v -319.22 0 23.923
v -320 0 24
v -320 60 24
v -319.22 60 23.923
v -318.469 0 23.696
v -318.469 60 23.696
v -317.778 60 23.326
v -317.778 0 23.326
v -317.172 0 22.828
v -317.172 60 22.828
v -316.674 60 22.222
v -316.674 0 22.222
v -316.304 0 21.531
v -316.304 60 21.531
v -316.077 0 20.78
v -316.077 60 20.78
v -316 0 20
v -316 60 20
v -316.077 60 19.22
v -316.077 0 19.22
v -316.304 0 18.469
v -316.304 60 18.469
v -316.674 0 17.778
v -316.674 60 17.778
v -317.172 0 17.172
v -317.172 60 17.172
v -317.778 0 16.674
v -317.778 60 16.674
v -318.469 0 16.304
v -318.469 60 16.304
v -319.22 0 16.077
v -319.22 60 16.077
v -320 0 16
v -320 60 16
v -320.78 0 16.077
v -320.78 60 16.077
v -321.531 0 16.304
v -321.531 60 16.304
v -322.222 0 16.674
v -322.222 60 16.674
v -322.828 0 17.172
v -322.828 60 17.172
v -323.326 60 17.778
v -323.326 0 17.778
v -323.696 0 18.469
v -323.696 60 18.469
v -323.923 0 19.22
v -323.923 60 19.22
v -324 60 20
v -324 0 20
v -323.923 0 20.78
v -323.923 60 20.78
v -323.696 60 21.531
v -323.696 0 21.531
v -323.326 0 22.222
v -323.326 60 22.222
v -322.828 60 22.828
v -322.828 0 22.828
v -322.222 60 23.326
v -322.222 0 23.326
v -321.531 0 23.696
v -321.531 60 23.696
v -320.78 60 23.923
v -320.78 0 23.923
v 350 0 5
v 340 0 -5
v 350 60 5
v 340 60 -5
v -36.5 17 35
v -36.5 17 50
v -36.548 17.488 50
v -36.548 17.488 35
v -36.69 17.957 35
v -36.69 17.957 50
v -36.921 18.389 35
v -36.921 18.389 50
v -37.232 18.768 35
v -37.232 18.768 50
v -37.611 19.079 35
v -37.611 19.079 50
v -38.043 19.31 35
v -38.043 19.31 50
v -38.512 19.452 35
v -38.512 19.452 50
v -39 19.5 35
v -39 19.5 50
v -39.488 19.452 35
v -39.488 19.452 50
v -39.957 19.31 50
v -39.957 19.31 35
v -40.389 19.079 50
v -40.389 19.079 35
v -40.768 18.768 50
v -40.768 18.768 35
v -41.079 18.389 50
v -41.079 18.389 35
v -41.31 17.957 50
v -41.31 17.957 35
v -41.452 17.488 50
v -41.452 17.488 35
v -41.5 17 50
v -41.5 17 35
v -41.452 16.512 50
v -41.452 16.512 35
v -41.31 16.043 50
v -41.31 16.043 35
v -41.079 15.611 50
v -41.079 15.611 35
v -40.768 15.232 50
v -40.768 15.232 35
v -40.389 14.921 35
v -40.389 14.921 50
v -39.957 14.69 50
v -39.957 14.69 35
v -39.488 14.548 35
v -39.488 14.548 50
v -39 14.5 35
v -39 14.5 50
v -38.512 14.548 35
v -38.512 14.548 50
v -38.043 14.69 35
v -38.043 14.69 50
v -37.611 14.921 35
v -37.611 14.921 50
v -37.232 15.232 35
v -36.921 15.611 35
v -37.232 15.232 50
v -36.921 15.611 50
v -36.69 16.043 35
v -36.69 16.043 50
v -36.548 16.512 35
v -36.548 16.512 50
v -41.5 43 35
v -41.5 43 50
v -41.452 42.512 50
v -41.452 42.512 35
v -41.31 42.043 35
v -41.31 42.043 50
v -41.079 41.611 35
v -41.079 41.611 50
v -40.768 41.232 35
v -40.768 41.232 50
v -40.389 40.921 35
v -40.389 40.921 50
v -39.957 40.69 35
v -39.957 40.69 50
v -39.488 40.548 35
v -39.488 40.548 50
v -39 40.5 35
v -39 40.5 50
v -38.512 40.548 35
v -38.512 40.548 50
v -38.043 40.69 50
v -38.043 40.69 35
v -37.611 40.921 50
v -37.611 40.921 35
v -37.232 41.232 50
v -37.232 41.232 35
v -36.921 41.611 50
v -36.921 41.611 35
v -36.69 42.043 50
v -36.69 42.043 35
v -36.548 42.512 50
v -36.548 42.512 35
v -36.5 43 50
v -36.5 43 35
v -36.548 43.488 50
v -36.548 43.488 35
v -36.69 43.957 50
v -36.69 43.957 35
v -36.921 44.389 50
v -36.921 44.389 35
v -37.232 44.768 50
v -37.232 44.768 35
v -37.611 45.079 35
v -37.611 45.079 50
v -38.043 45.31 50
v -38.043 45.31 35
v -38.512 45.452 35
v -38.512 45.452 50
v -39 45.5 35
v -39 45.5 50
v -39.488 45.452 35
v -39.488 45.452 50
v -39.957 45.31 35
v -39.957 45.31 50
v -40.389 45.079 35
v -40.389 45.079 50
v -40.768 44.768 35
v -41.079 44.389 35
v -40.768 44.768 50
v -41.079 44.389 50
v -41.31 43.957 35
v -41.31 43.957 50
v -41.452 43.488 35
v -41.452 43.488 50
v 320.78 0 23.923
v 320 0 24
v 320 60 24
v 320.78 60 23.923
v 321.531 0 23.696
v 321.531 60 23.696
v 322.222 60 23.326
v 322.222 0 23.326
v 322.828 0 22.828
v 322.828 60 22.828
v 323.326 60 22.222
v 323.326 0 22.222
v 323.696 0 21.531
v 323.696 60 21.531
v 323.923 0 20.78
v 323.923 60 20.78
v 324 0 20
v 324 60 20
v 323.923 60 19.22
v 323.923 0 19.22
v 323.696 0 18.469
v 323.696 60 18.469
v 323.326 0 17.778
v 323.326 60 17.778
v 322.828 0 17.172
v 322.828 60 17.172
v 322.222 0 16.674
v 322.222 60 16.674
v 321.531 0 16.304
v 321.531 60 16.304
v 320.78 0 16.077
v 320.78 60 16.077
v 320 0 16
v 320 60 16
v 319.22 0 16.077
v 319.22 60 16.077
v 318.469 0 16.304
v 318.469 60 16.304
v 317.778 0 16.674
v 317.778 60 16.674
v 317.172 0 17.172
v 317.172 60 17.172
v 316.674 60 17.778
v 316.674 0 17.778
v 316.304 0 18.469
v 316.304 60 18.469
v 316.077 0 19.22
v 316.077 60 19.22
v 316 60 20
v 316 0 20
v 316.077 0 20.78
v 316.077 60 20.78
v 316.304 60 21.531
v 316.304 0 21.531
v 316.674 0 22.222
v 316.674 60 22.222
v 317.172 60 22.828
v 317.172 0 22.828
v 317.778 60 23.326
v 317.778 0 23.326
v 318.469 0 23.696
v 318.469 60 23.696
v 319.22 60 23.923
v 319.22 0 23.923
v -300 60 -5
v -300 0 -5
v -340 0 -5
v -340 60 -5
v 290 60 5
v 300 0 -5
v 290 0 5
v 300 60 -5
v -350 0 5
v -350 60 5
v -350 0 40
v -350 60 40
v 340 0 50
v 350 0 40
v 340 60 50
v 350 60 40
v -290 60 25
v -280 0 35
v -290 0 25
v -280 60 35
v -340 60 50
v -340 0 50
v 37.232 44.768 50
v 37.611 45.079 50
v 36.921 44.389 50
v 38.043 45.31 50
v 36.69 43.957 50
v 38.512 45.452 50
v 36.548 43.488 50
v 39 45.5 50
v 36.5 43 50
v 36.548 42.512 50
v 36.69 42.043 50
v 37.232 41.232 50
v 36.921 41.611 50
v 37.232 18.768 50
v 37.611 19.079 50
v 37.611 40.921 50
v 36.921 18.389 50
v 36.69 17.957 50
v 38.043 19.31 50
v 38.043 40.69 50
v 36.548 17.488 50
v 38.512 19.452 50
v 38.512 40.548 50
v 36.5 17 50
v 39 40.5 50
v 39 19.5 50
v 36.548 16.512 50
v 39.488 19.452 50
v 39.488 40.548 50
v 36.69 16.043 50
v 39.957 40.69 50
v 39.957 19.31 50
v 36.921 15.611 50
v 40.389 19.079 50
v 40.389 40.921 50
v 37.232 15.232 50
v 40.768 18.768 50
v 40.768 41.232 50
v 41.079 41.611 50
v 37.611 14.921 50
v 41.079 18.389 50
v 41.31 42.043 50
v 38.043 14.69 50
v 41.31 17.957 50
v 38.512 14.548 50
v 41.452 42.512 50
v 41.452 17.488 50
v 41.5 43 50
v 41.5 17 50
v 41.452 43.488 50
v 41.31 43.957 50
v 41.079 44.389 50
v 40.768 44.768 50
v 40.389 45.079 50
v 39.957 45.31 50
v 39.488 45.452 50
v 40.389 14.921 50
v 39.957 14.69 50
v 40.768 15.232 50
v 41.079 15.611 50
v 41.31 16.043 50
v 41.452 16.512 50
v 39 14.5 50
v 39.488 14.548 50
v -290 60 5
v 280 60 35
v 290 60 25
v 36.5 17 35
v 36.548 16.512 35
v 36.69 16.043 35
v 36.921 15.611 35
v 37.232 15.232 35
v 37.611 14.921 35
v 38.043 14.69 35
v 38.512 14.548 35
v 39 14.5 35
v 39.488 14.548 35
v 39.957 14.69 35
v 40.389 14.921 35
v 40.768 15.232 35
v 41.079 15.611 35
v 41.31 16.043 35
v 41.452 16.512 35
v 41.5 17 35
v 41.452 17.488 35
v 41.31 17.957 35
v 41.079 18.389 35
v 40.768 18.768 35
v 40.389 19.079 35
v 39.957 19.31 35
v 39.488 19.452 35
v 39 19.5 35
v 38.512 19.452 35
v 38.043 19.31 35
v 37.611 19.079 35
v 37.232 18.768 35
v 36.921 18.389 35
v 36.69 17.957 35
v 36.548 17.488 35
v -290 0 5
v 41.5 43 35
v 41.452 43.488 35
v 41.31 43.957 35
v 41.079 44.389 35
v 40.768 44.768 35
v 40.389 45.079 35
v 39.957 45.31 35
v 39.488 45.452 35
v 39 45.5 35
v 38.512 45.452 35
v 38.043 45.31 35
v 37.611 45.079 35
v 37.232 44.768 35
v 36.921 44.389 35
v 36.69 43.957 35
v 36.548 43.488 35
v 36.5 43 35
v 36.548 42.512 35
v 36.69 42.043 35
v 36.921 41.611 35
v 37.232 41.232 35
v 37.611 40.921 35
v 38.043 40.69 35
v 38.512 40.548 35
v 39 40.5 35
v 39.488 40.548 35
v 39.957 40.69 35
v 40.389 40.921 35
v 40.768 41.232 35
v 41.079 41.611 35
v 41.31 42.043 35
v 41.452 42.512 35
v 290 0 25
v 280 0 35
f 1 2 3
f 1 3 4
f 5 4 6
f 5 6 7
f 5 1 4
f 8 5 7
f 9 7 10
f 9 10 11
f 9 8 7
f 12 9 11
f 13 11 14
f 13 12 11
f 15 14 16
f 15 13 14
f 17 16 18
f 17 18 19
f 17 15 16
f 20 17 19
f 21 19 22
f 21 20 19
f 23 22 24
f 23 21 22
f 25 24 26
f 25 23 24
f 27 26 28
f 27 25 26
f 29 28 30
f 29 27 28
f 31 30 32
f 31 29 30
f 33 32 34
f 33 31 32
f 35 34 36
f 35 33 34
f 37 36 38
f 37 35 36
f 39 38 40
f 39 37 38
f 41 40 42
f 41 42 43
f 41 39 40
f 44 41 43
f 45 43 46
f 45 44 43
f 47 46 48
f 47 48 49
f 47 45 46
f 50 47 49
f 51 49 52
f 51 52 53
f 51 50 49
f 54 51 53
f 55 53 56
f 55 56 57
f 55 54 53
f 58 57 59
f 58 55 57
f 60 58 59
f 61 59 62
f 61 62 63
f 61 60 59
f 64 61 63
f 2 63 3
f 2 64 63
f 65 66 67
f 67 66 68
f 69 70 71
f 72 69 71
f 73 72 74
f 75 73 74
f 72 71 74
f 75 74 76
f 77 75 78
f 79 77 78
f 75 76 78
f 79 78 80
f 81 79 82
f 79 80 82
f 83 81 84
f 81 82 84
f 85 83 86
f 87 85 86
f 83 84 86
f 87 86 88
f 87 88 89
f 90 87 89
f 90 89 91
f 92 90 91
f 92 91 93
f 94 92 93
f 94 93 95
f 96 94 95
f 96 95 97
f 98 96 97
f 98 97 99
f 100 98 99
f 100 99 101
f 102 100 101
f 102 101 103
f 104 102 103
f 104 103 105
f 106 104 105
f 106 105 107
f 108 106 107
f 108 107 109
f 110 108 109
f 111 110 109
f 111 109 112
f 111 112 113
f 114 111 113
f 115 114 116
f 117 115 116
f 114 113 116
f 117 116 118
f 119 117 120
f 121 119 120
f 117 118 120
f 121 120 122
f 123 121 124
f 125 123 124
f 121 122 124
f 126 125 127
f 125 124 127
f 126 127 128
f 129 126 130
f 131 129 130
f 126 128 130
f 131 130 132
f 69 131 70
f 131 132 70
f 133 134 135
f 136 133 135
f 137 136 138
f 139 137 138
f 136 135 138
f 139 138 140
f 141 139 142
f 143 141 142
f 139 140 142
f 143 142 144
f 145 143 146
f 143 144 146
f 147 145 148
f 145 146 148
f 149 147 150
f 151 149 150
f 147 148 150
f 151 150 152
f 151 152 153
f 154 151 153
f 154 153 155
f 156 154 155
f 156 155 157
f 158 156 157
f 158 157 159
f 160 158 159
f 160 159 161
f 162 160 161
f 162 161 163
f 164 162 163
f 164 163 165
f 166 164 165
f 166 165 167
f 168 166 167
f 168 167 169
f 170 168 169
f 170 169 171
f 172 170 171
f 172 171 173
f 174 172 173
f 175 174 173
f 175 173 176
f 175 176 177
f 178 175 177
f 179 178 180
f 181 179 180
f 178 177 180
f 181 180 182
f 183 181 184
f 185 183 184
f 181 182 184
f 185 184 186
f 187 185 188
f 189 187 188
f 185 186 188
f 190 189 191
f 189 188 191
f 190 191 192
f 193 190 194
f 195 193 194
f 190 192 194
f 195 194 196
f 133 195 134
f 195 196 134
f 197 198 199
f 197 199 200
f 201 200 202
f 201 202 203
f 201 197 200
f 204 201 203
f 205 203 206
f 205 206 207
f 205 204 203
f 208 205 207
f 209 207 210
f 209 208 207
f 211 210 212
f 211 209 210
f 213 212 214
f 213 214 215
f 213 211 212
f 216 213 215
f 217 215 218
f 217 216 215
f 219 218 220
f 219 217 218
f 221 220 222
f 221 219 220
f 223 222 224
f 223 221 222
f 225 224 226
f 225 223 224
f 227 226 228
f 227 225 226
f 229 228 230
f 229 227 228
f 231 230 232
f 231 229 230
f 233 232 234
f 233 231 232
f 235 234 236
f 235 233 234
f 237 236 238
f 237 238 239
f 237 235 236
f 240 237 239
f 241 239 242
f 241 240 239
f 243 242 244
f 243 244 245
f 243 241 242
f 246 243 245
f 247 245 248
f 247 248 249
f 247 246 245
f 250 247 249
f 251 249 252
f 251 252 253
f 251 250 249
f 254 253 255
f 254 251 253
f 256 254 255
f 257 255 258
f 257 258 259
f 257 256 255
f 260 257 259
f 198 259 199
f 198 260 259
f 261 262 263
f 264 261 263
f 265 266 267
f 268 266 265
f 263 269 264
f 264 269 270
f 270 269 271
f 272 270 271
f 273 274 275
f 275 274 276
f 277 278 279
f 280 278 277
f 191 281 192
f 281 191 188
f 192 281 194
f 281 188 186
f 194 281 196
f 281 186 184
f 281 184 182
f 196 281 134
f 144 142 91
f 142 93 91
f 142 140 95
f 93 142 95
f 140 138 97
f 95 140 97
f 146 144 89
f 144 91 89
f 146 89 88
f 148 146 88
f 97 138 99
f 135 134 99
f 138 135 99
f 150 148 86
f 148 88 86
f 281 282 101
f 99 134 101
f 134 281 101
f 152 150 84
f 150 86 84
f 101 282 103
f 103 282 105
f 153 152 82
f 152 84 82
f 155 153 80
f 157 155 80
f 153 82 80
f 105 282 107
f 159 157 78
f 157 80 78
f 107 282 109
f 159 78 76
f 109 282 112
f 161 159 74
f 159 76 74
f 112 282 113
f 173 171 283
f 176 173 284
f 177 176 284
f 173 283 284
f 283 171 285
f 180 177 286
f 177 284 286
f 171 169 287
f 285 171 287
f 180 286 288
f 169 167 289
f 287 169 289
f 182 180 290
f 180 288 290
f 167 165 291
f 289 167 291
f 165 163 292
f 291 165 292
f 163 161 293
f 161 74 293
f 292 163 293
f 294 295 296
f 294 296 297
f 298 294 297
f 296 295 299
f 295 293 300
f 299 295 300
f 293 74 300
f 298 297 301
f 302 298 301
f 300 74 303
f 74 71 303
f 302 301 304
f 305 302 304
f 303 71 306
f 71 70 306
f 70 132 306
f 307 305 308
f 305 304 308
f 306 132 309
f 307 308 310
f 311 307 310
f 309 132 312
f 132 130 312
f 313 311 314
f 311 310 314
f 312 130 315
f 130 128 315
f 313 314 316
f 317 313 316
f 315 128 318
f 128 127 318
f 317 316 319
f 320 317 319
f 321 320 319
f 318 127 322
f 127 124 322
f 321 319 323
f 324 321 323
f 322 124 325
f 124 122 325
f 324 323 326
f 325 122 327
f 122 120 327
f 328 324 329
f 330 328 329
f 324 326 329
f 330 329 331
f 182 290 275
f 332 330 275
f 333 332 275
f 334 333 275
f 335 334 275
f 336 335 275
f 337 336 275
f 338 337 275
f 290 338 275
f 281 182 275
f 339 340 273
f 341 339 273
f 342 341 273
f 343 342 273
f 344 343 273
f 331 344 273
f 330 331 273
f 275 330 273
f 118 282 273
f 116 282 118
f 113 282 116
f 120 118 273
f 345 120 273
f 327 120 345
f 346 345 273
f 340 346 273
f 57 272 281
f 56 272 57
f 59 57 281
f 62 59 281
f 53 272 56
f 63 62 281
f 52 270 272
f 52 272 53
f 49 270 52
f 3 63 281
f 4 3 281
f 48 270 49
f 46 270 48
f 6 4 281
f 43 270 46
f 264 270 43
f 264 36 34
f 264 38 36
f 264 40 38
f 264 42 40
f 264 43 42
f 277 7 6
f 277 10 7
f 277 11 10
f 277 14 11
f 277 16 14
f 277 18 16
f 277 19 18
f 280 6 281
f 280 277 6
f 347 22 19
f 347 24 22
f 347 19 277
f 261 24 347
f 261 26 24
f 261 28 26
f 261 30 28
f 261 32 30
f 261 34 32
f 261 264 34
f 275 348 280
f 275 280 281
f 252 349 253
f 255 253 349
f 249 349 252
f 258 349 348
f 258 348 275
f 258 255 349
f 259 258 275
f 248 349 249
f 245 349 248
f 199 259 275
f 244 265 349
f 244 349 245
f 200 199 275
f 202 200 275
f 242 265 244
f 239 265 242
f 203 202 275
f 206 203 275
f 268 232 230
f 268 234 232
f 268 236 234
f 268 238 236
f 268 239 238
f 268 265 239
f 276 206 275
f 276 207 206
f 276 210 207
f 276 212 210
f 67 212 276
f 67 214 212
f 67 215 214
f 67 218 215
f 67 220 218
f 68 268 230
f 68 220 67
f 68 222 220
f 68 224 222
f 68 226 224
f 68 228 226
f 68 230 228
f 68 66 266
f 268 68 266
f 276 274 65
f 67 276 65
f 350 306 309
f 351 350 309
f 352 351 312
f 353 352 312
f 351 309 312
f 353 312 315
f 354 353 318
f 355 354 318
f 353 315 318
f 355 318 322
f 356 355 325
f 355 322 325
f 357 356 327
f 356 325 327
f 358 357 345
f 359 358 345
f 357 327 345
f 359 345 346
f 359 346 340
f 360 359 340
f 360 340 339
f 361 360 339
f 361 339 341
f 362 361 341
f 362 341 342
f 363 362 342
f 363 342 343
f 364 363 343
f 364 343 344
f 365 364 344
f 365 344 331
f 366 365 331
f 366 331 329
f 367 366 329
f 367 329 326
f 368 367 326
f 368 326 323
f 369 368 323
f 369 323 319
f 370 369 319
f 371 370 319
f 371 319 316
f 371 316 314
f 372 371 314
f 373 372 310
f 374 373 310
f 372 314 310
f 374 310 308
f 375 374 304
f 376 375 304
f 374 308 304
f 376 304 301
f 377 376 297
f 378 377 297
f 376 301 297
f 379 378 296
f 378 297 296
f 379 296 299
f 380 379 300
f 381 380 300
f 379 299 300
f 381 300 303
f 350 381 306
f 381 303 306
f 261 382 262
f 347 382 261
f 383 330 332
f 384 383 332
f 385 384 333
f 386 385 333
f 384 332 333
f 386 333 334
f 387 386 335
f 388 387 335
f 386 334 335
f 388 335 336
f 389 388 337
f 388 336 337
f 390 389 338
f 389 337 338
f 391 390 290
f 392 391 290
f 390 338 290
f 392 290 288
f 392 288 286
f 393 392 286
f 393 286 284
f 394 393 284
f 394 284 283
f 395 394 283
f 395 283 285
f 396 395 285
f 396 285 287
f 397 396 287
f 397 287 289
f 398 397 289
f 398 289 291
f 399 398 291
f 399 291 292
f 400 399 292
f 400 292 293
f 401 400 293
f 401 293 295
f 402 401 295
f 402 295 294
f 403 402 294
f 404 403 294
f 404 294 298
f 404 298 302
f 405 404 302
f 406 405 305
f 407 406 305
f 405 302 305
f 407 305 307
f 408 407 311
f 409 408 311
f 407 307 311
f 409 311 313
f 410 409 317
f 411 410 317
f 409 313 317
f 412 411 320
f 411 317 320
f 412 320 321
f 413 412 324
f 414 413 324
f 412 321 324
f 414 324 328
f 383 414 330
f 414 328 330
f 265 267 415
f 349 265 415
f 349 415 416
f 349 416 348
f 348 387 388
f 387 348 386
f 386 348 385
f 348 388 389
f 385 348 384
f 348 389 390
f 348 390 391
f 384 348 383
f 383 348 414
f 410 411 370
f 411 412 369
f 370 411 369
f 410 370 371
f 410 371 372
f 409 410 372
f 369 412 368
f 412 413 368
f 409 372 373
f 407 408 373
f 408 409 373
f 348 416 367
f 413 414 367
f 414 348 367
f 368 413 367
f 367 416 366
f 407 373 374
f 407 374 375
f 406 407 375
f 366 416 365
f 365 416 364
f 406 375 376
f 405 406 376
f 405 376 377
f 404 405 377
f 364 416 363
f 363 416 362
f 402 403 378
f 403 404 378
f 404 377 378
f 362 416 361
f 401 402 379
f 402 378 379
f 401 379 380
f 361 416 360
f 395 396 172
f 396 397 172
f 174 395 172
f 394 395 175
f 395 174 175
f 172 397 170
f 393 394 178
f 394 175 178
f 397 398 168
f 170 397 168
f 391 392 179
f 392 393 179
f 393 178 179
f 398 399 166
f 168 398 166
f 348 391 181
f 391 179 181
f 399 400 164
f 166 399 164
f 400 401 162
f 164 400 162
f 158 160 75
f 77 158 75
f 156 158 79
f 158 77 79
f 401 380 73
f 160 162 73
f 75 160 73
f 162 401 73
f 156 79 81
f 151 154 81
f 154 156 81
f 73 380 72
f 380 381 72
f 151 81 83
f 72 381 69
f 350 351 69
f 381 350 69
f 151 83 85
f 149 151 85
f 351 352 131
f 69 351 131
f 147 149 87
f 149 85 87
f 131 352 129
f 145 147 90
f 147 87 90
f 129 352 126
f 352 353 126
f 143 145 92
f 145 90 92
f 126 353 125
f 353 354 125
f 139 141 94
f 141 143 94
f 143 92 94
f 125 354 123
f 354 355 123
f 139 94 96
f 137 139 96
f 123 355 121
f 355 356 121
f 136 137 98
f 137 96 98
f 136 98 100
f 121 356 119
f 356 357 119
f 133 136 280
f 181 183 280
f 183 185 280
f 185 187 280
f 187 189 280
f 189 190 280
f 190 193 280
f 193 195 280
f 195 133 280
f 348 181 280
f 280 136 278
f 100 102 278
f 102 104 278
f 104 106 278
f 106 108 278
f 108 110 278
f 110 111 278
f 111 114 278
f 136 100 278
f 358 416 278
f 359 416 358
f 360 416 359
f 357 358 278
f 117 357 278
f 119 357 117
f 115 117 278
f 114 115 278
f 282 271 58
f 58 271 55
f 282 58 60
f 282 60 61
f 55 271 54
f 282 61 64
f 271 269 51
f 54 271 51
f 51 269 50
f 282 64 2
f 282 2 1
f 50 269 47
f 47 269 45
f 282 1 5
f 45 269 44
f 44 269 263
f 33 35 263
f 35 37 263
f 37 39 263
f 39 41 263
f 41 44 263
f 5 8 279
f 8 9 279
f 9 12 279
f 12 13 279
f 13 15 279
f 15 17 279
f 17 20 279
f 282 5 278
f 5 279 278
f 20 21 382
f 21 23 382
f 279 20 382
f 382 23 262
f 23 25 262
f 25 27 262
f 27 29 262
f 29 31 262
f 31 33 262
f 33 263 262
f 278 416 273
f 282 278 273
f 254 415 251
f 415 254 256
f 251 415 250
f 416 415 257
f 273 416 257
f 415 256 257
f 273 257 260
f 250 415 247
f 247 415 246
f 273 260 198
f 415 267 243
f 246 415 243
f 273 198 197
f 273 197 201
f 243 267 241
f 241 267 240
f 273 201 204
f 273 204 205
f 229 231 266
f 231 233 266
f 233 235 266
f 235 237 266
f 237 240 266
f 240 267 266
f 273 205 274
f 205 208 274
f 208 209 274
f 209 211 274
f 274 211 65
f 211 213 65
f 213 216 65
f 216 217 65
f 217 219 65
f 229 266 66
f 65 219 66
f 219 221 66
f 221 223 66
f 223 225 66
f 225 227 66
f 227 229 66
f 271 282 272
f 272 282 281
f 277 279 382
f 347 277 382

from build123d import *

# Parameters (mm, degrees)
SKETCH2_R           = 4
BOSS_EXTRUDE2_DEPTH = 60
CHAMFER3_SIZE       = 10
SKETCH3_R           = 2.5
CUT_EXTRUDE1_DEPTH  = 360.339672177


with BuildPart() as part:
    # Sketch2 → Boss-Extrude2 (new body)
    with BuildSketch(Plane(origin=(0, 0, 0), x_dir=(1, 0, 0), z_dir=(0, 1, 0))):
        Polygon((-290, 5), (-350, 5), (-350, -50), (350, -50), (350, 5), (290, 5), (290, -35), (-290, -35), align=None)
        with Locations(Location((-320, -20, 0), (0, 0, 270))):
            Circle(SKETCH2_R, mode=Mode.SUBTRACT)
        with Locations(Location((320, -20, 0), (0, 0, 270))):
            Circle(SKETCH2_R, mode=Mode.SUBTRACT)
    extrude(amount=BOSS_EXTRUDE2_DEPTH)

    # Chamfer3
    chamfer3_edges = [part.edges().sort_by_distance(p)[0] for p in [
        (290, 30, -5),
        (350, 30, -5),
        (350, 30, 50),
        (-350, 30, 50),
        (-350, 30, -5),
        (-290, 30, -5),
        (-290, 30, 35),
        (290, 30, 35),
    ]]
    chamfer(chamfer3_edges, length=CHAMFER3_SIZE)

    # Sketch3 → Cut-Extrude1 (cut, through all)
    with BuildSketch(Plane.XY.offset(50)):
        with Locations((39, 43)):
            Circle(SKETCH3_R)
        with Locations(Location((39, 17, 0), (0, 0, 180))):
            Circle(SKETCH3_R)
        with Locations((-39, 17)):
            Circle(SKETCH3_R)
        with Locations(Location((-39, 43, 0), (0, 0, 180))):
            Circle(SKETCH3_R)
    extrude(amount=-CUT_EXTRUDE1_DEPTH, mode=Mode.SUBTRACT)


solid = part.part
